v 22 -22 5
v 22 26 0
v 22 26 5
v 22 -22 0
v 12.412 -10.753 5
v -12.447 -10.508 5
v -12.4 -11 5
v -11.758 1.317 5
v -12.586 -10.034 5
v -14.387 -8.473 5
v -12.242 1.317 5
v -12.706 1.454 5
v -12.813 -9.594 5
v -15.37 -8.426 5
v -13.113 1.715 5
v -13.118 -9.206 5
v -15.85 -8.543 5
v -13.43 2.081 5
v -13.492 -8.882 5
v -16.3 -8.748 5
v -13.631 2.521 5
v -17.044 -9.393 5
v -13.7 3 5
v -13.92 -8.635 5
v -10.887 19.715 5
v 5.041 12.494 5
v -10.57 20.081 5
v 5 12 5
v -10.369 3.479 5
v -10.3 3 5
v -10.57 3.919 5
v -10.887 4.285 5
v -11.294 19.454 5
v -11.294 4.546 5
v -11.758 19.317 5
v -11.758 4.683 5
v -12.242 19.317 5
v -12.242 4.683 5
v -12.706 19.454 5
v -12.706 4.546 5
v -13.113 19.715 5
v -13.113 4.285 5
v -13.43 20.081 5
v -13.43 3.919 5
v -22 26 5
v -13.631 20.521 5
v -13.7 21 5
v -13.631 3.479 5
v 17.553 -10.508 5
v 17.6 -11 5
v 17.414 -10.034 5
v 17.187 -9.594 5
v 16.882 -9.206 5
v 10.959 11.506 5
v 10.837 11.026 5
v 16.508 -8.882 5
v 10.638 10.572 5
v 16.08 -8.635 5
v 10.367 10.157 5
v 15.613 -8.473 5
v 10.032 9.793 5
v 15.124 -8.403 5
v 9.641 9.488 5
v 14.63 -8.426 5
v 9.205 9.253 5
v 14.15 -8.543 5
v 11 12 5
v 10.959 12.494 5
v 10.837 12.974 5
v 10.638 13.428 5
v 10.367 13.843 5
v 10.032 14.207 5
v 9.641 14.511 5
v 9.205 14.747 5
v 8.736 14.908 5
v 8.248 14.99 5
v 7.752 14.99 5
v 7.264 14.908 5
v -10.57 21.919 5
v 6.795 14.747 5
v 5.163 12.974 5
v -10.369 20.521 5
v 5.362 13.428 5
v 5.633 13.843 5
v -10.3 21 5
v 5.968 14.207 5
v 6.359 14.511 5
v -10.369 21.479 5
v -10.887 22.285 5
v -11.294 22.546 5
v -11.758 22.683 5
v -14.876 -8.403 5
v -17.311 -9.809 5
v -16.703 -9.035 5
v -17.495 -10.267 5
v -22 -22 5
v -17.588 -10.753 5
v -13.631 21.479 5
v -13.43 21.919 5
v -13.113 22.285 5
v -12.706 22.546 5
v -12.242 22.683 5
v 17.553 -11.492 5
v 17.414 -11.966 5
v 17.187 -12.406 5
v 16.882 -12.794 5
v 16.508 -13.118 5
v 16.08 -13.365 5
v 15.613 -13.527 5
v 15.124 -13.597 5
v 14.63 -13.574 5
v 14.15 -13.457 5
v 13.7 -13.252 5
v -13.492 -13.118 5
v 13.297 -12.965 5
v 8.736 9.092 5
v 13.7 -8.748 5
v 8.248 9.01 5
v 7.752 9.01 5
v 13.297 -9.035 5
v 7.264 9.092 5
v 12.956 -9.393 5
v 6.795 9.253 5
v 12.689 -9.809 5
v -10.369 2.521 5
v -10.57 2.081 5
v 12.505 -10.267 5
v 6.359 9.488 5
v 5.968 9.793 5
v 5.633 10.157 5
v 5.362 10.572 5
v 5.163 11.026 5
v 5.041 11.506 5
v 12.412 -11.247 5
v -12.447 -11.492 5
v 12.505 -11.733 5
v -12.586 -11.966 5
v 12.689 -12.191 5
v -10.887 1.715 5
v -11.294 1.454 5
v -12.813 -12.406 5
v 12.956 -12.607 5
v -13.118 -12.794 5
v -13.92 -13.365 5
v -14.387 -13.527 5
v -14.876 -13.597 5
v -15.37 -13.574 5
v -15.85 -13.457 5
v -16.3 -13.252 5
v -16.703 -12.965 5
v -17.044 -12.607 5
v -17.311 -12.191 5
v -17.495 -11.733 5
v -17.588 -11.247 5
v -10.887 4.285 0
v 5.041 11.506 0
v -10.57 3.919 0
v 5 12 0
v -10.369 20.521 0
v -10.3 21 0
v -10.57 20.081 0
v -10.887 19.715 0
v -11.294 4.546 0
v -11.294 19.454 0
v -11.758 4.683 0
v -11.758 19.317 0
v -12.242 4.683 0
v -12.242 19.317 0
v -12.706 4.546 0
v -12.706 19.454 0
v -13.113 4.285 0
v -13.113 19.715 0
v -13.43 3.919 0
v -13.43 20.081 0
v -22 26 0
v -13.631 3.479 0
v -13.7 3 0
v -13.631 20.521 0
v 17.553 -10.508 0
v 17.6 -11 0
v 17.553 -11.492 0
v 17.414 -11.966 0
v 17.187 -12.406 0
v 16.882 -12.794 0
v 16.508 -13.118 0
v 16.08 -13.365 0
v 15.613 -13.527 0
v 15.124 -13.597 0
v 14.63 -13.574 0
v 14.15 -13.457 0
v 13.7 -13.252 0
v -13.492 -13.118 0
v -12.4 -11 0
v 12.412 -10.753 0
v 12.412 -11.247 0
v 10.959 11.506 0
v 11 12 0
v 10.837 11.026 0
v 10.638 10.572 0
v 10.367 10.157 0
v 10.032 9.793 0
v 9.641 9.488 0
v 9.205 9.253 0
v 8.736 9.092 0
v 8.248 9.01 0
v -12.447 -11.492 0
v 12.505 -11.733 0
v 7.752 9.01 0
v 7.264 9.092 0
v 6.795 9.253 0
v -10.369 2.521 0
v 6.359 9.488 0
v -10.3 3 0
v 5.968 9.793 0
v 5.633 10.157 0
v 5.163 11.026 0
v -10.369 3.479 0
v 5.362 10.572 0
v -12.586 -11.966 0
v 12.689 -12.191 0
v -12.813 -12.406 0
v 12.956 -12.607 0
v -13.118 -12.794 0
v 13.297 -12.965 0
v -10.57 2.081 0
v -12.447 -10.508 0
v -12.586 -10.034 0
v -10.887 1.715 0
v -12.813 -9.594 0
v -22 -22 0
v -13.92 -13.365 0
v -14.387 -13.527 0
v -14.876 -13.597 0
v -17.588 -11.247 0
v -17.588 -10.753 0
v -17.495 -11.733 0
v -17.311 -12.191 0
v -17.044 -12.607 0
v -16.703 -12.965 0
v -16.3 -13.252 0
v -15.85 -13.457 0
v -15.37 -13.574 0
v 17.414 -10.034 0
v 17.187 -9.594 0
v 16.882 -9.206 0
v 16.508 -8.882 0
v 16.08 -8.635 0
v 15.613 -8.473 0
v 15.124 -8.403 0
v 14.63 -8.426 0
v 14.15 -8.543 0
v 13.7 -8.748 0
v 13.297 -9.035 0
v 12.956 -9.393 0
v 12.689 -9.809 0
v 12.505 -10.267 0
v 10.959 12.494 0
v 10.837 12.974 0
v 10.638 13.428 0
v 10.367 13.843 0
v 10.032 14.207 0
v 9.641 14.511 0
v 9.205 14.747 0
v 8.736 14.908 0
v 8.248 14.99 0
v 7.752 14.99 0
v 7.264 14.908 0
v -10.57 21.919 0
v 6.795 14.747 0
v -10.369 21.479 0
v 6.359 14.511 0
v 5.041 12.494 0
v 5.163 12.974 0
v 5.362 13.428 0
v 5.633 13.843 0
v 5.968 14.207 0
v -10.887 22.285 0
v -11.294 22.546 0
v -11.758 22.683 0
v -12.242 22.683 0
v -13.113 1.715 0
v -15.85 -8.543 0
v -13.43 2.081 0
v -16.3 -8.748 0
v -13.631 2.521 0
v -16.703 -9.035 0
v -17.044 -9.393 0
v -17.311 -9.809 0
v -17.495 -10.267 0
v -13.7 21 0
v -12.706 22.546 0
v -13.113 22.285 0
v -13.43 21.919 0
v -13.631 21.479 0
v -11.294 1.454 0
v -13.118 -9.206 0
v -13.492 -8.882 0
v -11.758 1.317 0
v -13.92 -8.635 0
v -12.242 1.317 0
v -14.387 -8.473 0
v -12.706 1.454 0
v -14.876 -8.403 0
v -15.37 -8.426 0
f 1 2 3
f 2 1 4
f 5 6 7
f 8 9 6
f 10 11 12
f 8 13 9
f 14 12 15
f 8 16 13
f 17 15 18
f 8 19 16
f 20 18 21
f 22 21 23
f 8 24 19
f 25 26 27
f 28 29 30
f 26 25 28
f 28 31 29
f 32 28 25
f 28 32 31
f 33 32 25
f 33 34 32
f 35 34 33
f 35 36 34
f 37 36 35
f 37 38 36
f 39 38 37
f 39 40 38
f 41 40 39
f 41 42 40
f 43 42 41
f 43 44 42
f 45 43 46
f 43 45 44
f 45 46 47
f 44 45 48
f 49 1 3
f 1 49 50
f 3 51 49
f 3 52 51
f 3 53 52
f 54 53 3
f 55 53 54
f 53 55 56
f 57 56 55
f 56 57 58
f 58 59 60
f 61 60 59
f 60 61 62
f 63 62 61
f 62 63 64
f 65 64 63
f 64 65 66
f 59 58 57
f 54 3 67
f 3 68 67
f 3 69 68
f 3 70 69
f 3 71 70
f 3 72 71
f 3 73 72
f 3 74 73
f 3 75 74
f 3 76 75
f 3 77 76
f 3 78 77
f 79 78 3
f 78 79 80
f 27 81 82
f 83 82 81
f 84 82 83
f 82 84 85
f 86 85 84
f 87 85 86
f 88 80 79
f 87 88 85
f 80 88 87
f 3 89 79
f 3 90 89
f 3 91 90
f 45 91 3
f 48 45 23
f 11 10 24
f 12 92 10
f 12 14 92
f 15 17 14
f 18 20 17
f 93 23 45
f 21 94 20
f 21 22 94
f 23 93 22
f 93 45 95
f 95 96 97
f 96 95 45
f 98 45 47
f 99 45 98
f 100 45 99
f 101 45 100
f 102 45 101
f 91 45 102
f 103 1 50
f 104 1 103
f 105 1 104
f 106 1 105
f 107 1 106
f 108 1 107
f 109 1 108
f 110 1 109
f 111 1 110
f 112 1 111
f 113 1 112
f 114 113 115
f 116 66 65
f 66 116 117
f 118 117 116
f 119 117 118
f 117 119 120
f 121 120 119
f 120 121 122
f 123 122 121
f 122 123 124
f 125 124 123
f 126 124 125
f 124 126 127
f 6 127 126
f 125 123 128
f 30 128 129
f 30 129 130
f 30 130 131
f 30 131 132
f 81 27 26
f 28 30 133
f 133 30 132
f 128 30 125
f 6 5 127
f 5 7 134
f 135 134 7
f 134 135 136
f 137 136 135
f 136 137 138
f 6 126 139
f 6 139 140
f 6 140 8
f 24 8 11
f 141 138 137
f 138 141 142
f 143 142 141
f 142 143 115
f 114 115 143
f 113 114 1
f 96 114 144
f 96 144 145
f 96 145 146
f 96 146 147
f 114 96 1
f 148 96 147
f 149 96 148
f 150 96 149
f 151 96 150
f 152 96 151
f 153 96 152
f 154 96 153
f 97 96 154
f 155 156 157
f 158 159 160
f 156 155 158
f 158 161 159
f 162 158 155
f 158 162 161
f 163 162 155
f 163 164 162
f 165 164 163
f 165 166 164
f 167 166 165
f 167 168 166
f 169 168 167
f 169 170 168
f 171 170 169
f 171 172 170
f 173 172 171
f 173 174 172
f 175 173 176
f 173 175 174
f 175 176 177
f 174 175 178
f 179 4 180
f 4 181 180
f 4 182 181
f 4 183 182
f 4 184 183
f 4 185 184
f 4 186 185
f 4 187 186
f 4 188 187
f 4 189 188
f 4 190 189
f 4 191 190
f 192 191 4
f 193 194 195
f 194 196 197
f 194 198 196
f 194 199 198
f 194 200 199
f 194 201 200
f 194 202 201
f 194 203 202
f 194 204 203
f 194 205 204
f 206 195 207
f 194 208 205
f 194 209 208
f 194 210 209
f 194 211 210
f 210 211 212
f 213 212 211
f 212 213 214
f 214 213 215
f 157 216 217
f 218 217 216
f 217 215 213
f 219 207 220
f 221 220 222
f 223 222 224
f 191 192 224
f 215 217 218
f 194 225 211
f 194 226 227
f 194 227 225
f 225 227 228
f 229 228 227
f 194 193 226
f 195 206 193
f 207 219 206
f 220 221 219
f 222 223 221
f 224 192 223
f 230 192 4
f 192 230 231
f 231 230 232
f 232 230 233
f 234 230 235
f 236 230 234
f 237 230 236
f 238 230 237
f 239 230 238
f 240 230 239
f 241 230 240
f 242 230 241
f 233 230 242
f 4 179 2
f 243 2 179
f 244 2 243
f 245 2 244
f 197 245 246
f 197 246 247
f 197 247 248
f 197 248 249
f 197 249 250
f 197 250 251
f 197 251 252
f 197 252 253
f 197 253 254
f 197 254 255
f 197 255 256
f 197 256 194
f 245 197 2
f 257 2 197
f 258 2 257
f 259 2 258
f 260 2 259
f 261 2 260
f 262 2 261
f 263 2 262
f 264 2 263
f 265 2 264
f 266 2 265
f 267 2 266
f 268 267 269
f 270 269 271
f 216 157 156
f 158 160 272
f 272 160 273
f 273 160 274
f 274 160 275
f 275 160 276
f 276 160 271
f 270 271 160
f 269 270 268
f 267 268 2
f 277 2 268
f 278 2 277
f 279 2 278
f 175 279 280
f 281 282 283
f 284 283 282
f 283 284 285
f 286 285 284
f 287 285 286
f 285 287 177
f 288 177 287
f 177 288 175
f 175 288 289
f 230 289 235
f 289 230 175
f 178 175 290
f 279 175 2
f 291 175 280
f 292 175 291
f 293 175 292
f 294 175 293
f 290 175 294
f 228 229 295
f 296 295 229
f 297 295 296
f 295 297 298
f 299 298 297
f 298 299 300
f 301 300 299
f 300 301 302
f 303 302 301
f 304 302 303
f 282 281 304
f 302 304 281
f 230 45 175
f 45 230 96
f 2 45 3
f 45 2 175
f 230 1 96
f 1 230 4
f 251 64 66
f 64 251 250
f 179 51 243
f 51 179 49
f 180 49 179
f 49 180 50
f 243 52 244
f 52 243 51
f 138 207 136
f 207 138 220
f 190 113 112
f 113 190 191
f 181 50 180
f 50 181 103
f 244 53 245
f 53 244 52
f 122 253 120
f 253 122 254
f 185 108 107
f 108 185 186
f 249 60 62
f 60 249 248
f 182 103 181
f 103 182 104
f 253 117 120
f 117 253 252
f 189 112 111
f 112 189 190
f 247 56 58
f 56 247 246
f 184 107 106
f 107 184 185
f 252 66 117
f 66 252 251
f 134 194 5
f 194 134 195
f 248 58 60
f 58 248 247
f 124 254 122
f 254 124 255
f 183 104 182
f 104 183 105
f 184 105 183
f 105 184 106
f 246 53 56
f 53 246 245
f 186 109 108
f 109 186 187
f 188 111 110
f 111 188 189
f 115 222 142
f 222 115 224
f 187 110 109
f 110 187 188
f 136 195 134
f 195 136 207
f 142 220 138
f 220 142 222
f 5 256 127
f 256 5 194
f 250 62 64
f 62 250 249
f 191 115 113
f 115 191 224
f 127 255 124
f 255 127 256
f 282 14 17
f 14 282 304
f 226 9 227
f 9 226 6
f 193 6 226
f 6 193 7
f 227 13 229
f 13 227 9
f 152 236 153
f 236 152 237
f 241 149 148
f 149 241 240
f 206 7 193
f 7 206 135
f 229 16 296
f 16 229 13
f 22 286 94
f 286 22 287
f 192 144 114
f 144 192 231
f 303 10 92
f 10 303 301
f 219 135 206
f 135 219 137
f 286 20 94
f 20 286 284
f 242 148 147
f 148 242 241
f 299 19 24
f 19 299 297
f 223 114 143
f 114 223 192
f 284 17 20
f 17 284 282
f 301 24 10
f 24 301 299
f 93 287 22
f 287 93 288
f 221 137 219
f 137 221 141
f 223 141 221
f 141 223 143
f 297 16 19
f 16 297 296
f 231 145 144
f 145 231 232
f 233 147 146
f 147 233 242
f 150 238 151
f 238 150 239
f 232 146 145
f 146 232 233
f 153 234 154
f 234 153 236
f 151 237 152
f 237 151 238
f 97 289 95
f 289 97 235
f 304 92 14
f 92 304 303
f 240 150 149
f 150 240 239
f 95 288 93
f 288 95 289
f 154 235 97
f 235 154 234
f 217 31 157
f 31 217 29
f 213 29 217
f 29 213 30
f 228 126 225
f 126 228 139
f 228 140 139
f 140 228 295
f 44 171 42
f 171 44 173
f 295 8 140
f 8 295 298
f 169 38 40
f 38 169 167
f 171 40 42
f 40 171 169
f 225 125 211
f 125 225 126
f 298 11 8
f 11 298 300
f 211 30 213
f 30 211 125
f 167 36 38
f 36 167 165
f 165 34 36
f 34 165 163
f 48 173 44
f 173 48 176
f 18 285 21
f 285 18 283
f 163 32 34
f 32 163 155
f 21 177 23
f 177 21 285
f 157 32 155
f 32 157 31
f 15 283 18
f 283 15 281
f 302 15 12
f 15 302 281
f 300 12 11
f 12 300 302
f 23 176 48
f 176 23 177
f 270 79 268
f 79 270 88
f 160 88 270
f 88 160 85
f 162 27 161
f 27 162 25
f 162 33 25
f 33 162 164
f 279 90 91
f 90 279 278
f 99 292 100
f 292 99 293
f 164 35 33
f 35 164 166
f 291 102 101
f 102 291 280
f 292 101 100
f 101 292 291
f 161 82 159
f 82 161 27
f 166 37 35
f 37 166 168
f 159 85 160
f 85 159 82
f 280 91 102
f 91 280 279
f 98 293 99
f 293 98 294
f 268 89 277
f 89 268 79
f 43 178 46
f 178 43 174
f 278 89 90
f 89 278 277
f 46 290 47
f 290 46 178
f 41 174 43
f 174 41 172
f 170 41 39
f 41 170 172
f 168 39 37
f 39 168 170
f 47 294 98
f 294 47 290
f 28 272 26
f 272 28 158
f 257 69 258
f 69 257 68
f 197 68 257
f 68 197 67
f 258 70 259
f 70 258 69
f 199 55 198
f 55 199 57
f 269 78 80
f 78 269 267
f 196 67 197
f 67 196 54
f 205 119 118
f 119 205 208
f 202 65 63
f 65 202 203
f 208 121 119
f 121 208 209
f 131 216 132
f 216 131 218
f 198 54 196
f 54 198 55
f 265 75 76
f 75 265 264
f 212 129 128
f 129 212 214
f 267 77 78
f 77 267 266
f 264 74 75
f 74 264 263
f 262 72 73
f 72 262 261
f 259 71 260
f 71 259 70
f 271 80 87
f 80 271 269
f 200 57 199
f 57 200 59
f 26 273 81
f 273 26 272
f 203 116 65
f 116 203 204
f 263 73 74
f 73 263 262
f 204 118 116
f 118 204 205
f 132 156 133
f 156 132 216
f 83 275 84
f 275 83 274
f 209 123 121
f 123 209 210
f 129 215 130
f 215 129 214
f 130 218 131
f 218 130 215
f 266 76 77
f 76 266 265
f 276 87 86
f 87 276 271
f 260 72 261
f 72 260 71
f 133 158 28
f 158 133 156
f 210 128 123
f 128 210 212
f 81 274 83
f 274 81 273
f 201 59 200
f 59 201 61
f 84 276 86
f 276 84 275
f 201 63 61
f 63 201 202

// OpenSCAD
$fs=$fs/4;
$fa=$fa/4;

r = 2.6;

module equerre(){
    e=5;
    difference(){
        union(){
            cube([20,e,20]);
            cube([e,20,20]);
        }
        translate([12,-10,10])rotate([90,0,0])cylinder(r=r, 100, center=true);
        translate([10,10,10])rotate([0,90,0])cylinder(r=r, 100, center=true);
    }
}


module moteur2(){
    translate([0,0,-70])cylinder(r=37/2, 70);
    for(i=[0, 60, 120, 180, 240, 300]){
         rotate([0,0,i]) translate([31/2, 0,0]) cylinder(r=3/2, 10);
    }
    translate([0, 7,0]) cylinder(r=13/2, 10);
    translate([0, 7,0]) cylinder(r=6/2, 10);
}


module support_moteur(){
    difference(){
        hull(){
            translate([0,-20,00])cylinder(r=37/2, 5);
            translate([-22,0,00])cube([44,20,5]);
        }
        translate([0,-20,00])moteur2();
        
        translate([15,10,00])cylinder(r=r, 100, center=true);
        translate([-15,10,00])cylinder(r=r, 100, center=true);
    }
    
}

module support_moteur2(){
    difference(){
        translate([-22,-22,00])cube([44,48,5]);
        
        translate([15,-11,00])cylinder(r=r, 100, center=true);
        translate([-15,-11,00])cylinder(r=r, 100, center=true);
        
        translate([-12,3,00])cylinder(r=1.7, 100, center=true);
        translate([-12,3+18,00])cylinder(r=1.7, 100, center=true);
        translate([-12+20,3+18/2,00])cylinder(r=3, 100, center=true);
    }
    
}

support_moteur2();
